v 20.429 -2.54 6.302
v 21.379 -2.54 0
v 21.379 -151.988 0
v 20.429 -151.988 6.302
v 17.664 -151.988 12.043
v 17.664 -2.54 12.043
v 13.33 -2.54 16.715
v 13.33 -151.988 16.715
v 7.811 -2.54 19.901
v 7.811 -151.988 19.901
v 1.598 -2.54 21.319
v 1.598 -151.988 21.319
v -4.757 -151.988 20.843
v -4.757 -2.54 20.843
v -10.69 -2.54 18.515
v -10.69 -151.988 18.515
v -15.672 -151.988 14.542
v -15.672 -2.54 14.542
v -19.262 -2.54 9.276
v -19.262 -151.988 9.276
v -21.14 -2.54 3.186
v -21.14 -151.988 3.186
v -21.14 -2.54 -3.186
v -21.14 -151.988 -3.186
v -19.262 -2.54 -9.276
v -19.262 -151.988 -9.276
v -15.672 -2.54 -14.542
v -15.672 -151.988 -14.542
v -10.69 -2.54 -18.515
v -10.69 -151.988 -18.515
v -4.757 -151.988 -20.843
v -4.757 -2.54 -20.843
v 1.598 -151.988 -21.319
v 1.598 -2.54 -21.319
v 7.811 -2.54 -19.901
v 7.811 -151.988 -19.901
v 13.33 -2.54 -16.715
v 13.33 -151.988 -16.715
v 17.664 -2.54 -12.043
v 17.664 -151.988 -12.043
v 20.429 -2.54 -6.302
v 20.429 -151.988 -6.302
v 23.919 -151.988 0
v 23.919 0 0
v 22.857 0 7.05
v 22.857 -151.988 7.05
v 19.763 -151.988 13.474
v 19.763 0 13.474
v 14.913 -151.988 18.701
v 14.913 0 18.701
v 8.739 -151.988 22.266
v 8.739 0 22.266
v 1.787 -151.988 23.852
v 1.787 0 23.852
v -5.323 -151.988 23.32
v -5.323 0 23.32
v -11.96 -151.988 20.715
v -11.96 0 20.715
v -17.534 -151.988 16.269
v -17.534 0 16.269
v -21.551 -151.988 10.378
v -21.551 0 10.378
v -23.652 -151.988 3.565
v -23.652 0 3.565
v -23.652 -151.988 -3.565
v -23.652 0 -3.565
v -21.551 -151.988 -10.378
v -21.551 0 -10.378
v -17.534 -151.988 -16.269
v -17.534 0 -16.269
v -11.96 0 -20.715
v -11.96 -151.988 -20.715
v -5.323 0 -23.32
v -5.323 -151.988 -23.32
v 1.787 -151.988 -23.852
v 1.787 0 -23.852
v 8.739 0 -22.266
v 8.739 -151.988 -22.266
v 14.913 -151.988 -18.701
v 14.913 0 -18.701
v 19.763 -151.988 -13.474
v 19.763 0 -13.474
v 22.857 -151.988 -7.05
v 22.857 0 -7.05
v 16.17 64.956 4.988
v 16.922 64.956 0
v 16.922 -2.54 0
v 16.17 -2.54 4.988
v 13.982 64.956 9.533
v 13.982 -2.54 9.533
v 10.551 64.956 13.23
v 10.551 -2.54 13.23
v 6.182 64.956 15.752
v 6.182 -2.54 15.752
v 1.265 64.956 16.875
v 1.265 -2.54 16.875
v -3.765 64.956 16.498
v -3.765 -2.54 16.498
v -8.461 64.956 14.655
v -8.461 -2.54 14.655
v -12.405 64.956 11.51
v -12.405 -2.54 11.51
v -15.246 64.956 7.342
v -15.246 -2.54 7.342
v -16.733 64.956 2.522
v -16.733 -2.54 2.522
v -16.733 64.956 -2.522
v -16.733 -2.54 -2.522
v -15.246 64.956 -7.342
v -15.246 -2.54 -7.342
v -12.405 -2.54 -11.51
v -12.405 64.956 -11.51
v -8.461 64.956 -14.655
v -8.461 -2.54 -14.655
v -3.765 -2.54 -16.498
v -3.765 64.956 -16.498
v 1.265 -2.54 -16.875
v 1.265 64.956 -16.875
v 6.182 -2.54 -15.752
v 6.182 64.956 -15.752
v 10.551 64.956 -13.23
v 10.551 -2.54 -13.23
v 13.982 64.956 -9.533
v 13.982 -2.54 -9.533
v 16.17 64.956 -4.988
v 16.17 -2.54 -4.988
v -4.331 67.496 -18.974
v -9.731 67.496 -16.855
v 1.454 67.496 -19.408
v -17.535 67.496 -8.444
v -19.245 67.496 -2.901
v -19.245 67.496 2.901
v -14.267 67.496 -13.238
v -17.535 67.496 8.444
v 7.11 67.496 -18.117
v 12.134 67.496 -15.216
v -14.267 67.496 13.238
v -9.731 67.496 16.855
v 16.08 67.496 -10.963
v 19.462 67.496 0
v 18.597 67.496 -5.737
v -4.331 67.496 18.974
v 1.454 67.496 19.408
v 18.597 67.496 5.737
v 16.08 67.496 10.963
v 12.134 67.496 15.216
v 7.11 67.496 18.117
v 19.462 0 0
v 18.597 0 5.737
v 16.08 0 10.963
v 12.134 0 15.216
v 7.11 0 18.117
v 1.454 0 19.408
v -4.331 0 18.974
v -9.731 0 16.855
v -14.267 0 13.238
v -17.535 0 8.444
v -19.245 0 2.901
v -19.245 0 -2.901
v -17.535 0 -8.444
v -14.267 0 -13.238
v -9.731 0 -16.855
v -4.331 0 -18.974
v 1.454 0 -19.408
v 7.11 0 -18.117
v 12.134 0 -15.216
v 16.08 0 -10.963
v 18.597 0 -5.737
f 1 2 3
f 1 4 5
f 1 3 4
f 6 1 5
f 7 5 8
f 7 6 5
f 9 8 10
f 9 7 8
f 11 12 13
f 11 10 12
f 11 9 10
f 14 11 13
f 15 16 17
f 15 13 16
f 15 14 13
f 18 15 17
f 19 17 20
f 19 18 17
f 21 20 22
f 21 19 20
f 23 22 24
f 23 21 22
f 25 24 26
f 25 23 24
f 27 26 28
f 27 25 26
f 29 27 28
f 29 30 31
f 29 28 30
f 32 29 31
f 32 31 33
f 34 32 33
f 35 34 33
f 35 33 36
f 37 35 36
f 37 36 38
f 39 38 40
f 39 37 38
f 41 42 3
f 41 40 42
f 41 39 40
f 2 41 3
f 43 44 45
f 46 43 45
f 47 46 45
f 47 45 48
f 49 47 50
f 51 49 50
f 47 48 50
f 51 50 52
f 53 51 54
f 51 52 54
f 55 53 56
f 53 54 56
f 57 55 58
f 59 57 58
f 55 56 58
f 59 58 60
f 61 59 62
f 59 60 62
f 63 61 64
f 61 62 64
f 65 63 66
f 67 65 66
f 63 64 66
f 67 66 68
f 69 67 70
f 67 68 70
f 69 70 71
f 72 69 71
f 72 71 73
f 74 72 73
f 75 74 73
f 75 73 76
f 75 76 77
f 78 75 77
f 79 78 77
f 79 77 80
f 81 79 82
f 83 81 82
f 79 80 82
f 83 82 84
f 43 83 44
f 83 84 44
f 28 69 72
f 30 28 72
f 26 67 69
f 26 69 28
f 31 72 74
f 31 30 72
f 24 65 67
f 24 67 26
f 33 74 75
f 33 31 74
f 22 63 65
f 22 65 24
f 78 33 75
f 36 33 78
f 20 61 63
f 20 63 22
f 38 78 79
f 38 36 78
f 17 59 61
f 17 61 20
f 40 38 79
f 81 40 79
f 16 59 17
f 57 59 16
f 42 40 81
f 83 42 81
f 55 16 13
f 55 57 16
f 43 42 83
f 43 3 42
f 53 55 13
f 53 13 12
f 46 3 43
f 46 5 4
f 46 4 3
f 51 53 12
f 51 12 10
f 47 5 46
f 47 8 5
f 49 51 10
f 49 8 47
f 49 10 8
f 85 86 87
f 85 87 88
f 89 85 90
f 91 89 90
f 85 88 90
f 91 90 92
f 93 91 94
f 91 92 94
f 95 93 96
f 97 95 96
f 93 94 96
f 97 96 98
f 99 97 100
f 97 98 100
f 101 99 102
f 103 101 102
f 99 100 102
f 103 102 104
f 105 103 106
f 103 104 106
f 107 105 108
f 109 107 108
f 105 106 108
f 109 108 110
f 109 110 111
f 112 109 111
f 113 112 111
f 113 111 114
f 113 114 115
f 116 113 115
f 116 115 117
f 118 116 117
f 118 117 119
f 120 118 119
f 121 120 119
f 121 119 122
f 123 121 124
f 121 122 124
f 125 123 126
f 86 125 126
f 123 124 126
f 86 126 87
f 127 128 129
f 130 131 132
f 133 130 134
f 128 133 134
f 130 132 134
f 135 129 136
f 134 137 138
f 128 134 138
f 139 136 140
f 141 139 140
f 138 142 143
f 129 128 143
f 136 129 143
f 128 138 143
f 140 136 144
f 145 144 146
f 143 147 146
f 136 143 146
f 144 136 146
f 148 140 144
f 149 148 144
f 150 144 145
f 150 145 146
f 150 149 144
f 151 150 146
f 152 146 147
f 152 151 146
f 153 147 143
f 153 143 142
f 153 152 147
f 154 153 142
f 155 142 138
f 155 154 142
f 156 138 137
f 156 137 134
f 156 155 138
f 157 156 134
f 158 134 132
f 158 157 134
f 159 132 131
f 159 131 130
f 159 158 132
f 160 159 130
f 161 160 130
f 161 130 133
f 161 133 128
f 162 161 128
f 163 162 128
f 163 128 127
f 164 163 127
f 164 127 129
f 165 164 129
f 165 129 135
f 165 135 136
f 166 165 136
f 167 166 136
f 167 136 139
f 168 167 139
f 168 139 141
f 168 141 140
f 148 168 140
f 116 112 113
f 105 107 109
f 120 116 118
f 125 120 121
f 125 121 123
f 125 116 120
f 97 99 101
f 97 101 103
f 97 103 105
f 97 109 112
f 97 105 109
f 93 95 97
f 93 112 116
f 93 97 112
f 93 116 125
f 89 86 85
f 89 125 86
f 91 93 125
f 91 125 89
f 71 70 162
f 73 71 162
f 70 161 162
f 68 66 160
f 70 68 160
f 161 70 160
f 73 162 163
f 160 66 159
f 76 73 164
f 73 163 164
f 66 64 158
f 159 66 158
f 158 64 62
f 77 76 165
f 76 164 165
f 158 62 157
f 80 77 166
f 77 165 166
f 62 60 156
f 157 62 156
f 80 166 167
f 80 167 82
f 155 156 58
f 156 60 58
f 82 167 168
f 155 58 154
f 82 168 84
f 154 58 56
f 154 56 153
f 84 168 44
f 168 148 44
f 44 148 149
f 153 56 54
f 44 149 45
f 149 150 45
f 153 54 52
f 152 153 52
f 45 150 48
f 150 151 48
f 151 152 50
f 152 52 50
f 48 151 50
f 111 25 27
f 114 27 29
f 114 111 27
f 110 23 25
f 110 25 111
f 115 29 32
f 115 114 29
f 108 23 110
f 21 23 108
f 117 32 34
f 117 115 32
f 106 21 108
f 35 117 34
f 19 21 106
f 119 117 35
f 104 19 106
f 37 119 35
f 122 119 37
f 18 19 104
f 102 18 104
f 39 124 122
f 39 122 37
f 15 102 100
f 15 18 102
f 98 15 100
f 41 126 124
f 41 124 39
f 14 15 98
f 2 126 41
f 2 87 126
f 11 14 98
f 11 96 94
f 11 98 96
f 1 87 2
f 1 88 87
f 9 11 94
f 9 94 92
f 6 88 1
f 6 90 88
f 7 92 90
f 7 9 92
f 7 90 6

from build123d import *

# Parameters (mm, degrees)
F0_R     = 23.9192744627
F1_DEPTH = 151.98784
F2_R     = 19.4620024737
F3_DEPTH = 219.48349
F4_T     = -2.54


with BuildPart() as f1:
    # F0 (on Front) → F1 (new body)
    with BuildSketch(Plane.XZ):
        Circle(F0_R)
    extrude(amount=F1_DEPTH)

    # F2 (on face) → F3 (join)
    with BuildSketch(Plane.XZ.offset(151.98784)):
        Circle(F2_R)
    extrude(amount=-F3_DEPTH)

    # F4
    f4_openings = [f1.faces().sort_by_distance(p)[0] for p in [
        (0, -151.98784, 0),
    ]]
    offset(amount=F4_T, openings=f4_openings, kind=Kind.INTERSECTION)


solid = f1.part
